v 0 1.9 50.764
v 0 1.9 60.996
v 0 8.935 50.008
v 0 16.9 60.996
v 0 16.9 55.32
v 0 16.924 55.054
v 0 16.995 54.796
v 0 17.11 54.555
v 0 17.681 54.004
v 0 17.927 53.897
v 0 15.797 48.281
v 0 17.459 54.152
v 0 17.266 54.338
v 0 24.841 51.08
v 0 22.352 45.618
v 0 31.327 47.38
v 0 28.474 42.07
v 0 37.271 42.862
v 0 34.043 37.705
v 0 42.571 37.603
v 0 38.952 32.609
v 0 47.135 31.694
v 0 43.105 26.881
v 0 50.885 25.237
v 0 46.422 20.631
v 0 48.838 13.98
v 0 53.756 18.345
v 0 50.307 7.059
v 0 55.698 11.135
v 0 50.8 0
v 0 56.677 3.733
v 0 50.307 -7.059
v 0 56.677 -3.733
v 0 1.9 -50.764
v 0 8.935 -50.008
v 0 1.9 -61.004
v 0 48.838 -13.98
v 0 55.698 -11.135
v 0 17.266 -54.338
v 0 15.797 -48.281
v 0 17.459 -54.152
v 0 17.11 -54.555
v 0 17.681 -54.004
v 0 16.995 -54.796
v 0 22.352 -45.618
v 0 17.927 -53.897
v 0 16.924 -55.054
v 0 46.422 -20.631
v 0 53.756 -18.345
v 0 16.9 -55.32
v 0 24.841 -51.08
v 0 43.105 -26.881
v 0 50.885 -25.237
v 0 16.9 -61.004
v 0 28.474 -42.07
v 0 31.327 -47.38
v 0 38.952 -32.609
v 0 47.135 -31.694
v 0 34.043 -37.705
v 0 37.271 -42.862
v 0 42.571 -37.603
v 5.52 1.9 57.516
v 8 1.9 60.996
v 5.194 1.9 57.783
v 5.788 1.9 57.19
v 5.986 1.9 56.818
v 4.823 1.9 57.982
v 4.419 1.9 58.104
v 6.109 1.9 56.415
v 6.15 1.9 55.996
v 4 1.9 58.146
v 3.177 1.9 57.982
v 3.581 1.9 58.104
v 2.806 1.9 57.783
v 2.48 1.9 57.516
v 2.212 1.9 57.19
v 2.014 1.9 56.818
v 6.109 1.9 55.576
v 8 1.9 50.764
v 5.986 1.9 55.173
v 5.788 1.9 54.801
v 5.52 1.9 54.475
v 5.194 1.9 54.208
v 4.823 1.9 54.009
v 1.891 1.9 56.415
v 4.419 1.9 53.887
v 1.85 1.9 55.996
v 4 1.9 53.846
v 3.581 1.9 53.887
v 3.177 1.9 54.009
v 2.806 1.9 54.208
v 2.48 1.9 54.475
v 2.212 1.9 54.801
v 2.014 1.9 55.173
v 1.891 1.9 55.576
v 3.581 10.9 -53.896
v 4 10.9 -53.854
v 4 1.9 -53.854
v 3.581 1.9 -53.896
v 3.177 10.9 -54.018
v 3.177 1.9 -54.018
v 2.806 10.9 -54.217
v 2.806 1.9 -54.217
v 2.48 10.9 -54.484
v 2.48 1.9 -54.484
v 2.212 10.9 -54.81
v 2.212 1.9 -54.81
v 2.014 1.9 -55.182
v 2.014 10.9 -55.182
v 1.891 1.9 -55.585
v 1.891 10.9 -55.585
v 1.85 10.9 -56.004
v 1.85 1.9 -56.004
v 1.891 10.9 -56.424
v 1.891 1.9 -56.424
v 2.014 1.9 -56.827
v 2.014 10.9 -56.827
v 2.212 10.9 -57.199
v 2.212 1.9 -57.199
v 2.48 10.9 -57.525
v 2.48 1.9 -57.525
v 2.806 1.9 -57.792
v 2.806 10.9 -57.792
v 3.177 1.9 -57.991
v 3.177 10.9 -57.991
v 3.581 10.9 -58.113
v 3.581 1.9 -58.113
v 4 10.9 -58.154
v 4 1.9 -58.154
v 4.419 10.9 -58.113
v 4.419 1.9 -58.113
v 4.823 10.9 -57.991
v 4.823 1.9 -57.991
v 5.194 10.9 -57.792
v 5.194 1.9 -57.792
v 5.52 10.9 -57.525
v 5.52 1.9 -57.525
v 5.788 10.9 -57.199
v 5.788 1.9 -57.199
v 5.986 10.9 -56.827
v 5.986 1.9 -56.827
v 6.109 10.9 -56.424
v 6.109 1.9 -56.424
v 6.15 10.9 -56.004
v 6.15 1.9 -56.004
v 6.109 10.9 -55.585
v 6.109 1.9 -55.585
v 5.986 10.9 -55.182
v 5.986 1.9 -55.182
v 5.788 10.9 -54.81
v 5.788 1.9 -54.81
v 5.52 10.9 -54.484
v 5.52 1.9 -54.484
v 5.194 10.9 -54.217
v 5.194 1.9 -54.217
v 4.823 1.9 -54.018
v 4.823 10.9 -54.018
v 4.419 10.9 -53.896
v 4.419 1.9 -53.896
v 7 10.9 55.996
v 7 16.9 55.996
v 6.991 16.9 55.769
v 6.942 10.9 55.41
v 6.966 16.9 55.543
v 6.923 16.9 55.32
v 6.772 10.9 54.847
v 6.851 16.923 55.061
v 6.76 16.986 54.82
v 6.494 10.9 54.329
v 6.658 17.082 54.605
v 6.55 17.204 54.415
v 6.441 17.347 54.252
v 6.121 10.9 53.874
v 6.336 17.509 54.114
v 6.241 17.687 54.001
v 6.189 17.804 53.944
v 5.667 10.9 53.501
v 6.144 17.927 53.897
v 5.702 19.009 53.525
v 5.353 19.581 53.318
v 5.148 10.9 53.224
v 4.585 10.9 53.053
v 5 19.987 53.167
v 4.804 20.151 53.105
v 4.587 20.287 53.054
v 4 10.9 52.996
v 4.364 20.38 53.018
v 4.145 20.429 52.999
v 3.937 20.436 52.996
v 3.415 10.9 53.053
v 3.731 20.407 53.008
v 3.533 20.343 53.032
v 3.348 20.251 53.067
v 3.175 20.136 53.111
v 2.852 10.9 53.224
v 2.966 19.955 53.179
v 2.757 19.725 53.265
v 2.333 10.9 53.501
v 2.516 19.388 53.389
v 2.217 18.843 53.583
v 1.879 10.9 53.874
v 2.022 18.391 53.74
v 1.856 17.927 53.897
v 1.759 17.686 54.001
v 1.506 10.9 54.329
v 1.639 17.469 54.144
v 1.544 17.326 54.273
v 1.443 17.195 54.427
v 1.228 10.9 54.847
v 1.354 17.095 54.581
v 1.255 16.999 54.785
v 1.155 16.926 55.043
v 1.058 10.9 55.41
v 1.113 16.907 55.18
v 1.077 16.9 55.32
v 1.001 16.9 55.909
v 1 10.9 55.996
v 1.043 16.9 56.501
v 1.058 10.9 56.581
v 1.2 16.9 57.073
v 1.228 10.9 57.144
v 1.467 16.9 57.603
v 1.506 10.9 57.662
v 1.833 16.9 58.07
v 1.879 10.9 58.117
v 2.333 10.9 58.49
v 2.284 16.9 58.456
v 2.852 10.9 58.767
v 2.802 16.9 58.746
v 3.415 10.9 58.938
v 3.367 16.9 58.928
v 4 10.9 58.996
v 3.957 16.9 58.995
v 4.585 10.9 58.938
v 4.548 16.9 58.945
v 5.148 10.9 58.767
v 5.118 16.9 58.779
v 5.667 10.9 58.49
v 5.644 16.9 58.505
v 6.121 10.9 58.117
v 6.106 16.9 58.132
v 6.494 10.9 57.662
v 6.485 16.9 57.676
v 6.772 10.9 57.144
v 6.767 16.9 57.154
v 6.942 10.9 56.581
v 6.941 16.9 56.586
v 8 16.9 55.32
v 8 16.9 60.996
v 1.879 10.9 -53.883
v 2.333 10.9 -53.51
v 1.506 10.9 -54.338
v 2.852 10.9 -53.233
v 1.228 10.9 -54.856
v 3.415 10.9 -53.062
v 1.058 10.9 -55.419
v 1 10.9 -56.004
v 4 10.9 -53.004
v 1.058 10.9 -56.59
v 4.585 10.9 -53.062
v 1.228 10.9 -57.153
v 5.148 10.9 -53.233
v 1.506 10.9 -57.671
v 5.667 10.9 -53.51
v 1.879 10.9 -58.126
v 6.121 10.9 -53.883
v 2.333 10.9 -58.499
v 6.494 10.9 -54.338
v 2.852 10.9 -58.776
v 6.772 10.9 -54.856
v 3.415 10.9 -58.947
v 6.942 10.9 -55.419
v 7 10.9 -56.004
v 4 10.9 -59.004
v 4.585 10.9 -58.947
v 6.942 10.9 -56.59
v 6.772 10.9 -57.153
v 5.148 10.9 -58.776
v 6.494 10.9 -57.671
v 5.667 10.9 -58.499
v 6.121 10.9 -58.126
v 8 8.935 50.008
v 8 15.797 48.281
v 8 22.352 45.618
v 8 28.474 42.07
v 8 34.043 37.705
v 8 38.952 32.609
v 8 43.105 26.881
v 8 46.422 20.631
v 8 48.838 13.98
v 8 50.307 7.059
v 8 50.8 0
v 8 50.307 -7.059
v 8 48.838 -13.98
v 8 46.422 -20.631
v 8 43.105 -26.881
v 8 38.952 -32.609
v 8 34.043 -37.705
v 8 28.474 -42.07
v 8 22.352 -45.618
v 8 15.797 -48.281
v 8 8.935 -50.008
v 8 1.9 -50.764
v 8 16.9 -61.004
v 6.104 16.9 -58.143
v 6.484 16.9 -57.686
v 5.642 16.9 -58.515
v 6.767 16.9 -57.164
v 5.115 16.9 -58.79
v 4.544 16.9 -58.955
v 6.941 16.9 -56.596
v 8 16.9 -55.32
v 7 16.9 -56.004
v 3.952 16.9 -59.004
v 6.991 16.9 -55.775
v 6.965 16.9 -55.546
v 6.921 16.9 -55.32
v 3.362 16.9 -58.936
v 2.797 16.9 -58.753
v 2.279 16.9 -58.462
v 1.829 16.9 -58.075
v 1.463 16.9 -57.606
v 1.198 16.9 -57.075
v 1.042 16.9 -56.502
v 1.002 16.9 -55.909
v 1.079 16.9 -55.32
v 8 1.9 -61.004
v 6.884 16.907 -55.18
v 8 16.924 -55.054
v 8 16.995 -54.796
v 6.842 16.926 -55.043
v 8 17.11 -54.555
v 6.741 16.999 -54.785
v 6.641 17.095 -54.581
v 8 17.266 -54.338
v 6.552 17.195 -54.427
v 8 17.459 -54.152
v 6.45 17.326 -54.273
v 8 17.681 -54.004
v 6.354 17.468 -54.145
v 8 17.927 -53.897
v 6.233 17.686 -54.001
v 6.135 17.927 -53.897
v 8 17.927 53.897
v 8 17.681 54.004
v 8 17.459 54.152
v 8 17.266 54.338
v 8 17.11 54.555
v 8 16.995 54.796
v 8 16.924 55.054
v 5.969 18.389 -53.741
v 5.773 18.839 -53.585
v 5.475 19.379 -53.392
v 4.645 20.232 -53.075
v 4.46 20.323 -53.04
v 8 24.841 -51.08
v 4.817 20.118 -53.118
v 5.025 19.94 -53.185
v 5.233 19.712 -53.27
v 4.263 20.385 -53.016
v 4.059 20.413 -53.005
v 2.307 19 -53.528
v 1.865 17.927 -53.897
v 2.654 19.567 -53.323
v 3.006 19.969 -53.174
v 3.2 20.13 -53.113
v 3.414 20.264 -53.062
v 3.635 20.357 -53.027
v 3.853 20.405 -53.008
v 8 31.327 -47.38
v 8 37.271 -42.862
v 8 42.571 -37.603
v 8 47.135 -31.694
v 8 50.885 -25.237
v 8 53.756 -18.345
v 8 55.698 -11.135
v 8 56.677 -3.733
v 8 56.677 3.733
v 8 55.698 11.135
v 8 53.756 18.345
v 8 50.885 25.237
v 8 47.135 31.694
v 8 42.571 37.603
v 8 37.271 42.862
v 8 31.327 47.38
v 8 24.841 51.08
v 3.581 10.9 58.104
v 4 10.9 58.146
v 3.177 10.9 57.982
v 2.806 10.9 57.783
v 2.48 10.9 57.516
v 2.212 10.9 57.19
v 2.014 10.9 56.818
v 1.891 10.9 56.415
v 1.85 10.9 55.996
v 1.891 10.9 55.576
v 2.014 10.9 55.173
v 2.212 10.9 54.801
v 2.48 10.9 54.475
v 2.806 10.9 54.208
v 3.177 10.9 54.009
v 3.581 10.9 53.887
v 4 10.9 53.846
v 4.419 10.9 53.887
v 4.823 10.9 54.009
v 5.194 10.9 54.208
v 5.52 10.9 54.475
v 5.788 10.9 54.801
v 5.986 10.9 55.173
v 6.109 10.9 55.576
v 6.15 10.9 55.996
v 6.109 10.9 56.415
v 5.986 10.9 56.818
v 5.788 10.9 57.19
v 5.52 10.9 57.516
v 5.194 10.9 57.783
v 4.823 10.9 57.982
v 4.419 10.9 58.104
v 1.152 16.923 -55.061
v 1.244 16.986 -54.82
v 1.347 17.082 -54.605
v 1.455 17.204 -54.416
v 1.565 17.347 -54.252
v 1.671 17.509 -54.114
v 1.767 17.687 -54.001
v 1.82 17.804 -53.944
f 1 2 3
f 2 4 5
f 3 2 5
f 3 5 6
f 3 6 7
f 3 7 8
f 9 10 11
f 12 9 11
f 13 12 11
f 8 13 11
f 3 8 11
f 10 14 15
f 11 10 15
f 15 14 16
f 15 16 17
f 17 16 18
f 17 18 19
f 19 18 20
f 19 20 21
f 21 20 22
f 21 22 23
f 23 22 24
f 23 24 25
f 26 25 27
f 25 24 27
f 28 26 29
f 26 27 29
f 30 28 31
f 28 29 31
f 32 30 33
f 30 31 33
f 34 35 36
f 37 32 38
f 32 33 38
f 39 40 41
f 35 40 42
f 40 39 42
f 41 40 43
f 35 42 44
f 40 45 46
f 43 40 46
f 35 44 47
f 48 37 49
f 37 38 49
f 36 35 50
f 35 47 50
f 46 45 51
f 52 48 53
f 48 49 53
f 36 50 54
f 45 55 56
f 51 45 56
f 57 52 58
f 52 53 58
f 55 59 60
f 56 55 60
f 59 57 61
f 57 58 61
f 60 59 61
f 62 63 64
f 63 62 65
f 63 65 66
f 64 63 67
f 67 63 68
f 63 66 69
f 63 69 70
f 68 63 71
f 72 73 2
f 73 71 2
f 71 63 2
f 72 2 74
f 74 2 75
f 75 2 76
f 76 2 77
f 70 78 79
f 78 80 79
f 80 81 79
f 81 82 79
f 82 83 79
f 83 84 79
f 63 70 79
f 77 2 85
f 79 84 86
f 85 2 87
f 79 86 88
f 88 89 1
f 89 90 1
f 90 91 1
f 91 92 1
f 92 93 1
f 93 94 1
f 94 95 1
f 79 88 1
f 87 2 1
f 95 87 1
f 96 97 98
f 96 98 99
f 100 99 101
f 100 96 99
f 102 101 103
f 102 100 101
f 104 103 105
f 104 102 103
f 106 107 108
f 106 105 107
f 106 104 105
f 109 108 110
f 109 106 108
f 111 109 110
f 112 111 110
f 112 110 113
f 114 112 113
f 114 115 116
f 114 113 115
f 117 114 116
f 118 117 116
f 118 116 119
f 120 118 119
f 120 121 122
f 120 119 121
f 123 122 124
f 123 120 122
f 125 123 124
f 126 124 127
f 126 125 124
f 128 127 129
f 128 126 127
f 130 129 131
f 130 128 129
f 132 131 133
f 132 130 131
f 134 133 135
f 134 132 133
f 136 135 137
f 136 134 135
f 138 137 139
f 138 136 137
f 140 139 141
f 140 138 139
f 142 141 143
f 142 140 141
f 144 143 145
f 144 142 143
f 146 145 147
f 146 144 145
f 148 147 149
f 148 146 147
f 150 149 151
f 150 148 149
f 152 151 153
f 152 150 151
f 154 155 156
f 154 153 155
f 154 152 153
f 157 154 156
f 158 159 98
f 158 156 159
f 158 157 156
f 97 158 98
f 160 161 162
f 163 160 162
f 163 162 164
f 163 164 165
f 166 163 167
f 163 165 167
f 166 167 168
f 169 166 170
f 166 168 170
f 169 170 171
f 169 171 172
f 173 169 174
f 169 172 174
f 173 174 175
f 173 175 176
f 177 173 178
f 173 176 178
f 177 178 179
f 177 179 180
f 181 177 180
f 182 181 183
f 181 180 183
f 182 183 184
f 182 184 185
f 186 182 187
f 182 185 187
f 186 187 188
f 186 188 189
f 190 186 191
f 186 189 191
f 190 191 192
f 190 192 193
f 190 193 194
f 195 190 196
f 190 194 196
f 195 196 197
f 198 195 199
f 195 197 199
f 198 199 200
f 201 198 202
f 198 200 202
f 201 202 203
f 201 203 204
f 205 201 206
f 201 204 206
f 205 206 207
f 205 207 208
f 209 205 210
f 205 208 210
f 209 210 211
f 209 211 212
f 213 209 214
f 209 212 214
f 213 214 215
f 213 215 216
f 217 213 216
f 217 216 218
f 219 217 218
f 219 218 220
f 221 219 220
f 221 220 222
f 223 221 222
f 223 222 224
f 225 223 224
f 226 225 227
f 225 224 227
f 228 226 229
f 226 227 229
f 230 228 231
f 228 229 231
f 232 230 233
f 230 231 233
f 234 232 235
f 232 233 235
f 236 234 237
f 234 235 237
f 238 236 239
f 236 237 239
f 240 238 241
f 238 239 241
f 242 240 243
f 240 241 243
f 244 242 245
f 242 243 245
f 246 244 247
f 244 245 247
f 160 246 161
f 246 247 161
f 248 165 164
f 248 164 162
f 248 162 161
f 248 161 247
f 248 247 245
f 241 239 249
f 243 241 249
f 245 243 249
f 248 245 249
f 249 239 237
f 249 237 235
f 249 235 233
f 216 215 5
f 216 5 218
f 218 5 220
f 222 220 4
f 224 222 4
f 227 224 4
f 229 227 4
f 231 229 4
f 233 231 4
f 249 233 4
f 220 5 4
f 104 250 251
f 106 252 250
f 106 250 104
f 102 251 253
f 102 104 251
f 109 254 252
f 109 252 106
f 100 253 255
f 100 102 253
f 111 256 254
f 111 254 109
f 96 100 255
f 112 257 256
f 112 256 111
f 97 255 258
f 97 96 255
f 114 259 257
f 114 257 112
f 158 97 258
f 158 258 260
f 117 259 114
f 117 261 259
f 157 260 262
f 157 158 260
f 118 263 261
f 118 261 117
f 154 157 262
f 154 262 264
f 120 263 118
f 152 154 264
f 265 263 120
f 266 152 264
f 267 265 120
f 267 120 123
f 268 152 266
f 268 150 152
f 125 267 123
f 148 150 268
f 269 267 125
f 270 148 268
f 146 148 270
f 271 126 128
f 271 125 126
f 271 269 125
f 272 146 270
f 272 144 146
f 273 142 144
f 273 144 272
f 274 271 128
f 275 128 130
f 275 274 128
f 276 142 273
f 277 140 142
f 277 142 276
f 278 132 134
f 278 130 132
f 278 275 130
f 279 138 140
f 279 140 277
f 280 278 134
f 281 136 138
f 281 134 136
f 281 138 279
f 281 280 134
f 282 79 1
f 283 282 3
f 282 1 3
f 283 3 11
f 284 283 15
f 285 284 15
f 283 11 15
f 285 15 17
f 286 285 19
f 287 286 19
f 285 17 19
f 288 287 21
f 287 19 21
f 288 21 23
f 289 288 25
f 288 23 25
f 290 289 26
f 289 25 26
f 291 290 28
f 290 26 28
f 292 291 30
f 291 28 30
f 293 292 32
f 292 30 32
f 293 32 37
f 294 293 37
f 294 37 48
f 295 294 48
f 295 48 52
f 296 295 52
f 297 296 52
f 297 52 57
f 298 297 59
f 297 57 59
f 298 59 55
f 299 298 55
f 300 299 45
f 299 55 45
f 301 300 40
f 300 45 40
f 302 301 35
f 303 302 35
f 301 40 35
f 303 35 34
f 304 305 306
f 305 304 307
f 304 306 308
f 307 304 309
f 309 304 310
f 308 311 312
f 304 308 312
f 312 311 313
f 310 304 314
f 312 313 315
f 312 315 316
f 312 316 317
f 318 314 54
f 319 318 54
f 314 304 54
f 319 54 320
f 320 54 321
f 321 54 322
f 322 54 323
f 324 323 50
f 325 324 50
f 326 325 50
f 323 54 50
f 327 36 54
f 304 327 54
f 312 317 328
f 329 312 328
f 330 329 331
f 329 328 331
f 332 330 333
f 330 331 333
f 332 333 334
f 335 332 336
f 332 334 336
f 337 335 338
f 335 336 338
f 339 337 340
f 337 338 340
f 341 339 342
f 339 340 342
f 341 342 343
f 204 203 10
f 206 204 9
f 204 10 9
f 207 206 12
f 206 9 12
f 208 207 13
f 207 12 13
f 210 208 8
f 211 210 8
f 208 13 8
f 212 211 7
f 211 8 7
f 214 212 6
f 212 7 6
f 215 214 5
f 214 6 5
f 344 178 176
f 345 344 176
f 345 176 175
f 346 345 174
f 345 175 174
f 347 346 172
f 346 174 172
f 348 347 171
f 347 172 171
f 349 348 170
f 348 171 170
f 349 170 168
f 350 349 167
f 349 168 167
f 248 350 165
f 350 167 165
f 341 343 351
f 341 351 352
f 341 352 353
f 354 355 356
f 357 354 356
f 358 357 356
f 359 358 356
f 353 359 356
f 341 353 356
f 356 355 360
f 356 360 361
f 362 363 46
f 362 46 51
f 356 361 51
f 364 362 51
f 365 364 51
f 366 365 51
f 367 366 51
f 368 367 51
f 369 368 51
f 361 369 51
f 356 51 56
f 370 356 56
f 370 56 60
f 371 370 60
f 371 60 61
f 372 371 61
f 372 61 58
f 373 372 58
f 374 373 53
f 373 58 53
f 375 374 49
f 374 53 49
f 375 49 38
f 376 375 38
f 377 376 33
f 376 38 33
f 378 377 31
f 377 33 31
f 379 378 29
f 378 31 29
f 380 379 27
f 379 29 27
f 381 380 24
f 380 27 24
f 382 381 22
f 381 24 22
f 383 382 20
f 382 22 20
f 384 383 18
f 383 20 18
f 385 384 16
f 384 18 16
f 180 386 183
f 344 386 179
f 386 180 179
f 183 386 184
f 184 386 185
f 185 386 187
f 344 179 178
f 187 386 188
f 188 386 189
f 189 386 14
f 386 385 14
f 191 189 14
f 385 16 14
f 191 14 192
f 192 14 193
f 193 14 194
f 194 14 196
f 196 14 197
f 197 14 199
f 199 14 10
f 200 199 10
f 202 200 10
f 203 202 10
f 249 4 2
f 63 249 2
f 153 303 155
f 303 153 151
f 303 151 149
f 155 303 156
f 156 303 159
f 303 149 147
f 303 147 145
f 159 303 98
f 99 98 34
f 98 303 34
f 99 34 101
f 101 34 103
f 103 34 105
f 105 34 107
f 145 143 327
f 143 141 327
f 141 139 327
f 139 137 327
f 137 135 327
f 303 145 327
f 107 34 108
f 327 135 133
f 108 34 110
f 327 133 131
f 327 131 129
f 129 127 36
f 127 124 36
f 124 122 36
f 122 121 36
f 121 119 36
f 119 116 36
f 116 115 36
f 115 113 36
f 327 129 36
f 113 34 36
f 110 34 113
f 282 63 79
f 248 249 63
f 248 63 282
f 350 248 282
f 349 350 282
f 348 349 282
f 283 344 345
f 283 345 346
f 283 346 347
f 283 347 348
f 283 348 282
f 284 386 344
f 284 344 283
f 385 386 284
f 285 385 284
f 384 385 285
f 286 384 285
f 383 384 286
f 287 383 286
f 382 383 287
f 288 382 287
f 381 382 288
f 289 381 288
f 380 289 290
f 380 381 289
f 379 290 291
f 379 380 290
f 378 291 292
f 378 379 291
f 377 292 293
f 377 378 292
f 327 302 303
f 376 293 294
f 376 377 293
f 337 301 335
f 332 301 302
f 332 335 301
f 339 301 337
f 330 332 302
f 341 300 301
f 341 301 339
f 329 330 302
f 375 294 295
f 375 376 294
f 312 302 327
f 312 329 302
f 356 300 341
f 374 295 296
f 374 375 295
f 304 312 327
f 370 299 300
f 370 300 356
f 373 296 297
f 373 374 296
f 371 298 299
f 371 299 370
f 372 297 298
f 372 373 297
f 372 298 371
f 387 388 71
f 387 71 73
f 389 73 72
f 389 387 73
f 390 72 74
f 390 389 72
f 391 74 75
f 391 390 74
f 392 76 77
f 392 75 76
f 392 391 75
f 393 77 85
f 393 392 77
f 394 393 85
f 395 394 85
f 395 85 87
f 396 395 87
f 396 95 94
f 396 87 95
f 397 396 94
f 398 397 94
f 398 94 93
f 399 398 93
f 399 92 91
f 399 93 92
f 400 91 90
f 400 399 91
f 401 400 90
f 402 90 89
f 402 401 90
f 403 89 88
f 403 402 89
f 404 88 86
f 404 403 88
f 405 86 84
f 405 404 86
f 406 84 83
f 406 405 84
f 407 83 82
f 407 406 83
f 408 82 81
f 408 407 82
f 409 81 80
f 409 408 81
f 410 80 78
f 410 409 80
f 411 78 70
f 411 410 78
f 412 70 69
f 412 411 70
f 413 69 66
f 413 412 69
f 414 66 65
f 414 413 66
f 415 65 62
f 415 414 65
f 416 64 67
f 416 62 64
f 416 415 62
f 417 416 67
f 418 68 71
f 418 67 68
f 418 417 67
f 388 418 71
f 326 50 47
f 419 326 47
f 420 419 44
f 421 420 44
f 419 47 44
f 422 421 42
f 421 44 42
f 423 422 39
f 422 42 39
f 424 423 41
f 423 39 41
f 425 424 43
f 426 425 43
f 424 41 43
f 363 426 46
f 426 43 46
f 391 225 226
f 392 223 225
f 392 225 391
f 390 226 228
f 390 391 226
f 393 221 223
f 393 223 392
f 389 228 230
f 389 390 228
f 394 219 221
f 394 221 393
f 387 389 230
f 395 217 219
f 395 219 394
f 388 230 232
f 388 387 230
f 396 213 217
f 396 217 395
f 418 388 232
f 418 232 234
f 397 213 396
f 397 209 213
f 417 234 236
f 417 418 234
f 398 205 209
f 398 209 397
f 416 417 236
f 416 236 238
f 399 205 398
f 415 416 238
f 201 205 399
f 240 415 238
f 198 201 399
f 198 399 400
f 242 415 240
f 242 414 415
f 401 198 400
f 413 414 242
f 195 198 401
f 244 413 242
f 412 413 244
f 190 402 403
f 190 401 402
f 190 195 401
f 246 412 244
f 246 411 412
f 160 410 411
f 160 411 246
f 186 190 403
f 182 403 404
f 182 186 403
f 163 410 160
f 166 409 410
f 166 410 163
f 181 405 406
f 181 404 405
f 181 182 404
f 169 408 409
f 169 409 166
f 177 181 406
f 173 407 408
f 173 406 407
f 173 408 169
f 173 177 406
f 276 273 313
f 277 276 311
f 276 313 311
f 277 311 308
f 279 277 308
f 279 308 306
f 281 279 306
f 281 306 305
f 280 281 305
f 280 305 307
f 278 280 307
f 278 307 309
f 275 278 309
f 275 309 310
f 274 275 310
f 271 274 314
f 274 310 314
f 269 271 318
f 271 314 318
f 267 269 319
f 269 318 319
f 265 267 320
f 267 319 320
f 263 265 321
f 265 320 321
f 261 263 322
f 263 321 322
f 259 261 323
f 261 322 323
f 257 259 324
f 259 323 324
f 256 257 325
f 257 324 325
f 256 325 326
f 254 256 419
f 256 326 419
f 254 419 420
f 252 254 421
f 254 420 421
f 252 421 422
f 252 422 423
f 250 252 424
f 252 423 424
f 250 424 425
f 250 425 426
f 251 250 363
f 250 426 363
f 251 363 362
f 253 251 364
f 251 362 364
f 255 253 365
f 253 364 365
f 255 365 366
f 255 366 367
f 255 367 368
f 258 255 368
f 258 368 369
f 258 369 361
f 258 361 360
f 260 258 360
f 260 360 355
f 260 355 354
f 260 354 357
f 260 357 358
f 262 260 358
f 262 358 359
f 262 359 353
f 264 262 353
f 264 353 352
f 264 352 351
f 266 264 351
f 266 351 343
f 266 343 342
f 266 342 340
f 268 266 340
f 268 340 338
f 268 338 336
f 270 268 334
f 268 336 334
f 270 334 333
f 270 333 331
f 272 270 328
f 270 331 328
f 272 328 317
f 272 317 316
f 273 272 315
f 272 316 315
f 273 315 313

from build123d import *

# Parameters (mm, degrees)
BOSS_EXTRUDE1_DEPTH           = 8
M4_CLEARANCE_HOLE1_AT_2_COUNT = 2
M4_CLEARANCE_HOLE1_AT_2_PITCH = 112
SKETCH7_R                     = 3
CUT_EXTRUDE1_DEPTH            = 10
CUT_EXTRUDE1_DEPTH_BACK       = 6


with BuildPart() as part:
    # Sketch1 → Boss-Extrude1 (new body)
    with BuildSketch(Plane(origin=(0, 0, 0), x_dir=(0, 0, -1), z_dir=(1, 0, 0))):
        with BuildLine():
            Line((-60.995543931, 1.9), (-50.764456069, 1.9))
            ThreePointArc((-50.764456069, 1.9), (0, 50.8), (50.764456069, 1.9))
            Line((50.764456069, 1.9), (61.004456069, 1.9))
            Line((61.004456069, 1.9), (61.004456069, 16.9))
            Line((61.004456069, 16.9), (55.320249457, 16.9))
            ThreePointArc((55.320249457, 16.9), (54.442787227, 17.18342282), (53.896915423, 17.926586621))
            ThreePointArc((53.896915423, 17.926586621), (0, 56.8), (-53.896915423, 17.926586621))
            ThreePointArc((-53.896915423, 17.926586621), (-54.442787227, 17.18342282), (-55.320249457, 16.9))
            Line((-55.320249457, 16.9), (-60.995543931, 16.9))
            Line((-60.995543931, 16.9), (-60.995543931, 1.9))
        make_face()
    extrude(amount=BOSS_EXTRUDE1_DEPTH)

    # Sketch4 → M4 Clearance Hole1 (revolve, cut)
    with BuildSketch(Plane(origin=(4, 16.9, -56.004456069), x_dir=(0, 0, 1), z_dir=(1, 0, 0))):
        Polygon((0, 0), (0, 17.291850331), (2.15, 16), (2.15, 0), align=None)
    m4_clearance_hole1 = revolve(axis=Axis((4, 23.25, -56.004456069), (0, -1, 0)), mode=Mode.SUBTRACT)

    # M4 Clearance Hole1 at 2: M4 Clearance Hole1 ×2
    with Locations(*[(0, 0, i * M4_CLEARANCE_HOLE1_AT_2_PITCH) for i in range(1, M4_CLEARANCE_HOLE1_AT_2_COUNT)]):
        add(m4_clearance_hole1, mode=Mode.SUBTRACT)

    # Sketch7 → Cut-Extrude1 (cut, two sides)
    with BuildSketch(Plane(origin=(0, 16.9, 0), x_dir=(1, 0, 0), z_dir=(0, 1, 0))) as cut_extrude1_sk:
        with Locations((4, 56.004456069)):
            Circle(SKETCH7_R)
        with Locations((4, -55.995543931)):
            Circle(SKETCH7_R)
    extrude(amount=CUT_EXTRUDE1_DEPTH, mode=Mode.SUBTRACT)
    extrude(cut_extrude1_sk.sketch, amount=-CUT_EXTRUDE1_DEPTH_BACK, mode=Mode.SUBTRACT)


solid = part.part
